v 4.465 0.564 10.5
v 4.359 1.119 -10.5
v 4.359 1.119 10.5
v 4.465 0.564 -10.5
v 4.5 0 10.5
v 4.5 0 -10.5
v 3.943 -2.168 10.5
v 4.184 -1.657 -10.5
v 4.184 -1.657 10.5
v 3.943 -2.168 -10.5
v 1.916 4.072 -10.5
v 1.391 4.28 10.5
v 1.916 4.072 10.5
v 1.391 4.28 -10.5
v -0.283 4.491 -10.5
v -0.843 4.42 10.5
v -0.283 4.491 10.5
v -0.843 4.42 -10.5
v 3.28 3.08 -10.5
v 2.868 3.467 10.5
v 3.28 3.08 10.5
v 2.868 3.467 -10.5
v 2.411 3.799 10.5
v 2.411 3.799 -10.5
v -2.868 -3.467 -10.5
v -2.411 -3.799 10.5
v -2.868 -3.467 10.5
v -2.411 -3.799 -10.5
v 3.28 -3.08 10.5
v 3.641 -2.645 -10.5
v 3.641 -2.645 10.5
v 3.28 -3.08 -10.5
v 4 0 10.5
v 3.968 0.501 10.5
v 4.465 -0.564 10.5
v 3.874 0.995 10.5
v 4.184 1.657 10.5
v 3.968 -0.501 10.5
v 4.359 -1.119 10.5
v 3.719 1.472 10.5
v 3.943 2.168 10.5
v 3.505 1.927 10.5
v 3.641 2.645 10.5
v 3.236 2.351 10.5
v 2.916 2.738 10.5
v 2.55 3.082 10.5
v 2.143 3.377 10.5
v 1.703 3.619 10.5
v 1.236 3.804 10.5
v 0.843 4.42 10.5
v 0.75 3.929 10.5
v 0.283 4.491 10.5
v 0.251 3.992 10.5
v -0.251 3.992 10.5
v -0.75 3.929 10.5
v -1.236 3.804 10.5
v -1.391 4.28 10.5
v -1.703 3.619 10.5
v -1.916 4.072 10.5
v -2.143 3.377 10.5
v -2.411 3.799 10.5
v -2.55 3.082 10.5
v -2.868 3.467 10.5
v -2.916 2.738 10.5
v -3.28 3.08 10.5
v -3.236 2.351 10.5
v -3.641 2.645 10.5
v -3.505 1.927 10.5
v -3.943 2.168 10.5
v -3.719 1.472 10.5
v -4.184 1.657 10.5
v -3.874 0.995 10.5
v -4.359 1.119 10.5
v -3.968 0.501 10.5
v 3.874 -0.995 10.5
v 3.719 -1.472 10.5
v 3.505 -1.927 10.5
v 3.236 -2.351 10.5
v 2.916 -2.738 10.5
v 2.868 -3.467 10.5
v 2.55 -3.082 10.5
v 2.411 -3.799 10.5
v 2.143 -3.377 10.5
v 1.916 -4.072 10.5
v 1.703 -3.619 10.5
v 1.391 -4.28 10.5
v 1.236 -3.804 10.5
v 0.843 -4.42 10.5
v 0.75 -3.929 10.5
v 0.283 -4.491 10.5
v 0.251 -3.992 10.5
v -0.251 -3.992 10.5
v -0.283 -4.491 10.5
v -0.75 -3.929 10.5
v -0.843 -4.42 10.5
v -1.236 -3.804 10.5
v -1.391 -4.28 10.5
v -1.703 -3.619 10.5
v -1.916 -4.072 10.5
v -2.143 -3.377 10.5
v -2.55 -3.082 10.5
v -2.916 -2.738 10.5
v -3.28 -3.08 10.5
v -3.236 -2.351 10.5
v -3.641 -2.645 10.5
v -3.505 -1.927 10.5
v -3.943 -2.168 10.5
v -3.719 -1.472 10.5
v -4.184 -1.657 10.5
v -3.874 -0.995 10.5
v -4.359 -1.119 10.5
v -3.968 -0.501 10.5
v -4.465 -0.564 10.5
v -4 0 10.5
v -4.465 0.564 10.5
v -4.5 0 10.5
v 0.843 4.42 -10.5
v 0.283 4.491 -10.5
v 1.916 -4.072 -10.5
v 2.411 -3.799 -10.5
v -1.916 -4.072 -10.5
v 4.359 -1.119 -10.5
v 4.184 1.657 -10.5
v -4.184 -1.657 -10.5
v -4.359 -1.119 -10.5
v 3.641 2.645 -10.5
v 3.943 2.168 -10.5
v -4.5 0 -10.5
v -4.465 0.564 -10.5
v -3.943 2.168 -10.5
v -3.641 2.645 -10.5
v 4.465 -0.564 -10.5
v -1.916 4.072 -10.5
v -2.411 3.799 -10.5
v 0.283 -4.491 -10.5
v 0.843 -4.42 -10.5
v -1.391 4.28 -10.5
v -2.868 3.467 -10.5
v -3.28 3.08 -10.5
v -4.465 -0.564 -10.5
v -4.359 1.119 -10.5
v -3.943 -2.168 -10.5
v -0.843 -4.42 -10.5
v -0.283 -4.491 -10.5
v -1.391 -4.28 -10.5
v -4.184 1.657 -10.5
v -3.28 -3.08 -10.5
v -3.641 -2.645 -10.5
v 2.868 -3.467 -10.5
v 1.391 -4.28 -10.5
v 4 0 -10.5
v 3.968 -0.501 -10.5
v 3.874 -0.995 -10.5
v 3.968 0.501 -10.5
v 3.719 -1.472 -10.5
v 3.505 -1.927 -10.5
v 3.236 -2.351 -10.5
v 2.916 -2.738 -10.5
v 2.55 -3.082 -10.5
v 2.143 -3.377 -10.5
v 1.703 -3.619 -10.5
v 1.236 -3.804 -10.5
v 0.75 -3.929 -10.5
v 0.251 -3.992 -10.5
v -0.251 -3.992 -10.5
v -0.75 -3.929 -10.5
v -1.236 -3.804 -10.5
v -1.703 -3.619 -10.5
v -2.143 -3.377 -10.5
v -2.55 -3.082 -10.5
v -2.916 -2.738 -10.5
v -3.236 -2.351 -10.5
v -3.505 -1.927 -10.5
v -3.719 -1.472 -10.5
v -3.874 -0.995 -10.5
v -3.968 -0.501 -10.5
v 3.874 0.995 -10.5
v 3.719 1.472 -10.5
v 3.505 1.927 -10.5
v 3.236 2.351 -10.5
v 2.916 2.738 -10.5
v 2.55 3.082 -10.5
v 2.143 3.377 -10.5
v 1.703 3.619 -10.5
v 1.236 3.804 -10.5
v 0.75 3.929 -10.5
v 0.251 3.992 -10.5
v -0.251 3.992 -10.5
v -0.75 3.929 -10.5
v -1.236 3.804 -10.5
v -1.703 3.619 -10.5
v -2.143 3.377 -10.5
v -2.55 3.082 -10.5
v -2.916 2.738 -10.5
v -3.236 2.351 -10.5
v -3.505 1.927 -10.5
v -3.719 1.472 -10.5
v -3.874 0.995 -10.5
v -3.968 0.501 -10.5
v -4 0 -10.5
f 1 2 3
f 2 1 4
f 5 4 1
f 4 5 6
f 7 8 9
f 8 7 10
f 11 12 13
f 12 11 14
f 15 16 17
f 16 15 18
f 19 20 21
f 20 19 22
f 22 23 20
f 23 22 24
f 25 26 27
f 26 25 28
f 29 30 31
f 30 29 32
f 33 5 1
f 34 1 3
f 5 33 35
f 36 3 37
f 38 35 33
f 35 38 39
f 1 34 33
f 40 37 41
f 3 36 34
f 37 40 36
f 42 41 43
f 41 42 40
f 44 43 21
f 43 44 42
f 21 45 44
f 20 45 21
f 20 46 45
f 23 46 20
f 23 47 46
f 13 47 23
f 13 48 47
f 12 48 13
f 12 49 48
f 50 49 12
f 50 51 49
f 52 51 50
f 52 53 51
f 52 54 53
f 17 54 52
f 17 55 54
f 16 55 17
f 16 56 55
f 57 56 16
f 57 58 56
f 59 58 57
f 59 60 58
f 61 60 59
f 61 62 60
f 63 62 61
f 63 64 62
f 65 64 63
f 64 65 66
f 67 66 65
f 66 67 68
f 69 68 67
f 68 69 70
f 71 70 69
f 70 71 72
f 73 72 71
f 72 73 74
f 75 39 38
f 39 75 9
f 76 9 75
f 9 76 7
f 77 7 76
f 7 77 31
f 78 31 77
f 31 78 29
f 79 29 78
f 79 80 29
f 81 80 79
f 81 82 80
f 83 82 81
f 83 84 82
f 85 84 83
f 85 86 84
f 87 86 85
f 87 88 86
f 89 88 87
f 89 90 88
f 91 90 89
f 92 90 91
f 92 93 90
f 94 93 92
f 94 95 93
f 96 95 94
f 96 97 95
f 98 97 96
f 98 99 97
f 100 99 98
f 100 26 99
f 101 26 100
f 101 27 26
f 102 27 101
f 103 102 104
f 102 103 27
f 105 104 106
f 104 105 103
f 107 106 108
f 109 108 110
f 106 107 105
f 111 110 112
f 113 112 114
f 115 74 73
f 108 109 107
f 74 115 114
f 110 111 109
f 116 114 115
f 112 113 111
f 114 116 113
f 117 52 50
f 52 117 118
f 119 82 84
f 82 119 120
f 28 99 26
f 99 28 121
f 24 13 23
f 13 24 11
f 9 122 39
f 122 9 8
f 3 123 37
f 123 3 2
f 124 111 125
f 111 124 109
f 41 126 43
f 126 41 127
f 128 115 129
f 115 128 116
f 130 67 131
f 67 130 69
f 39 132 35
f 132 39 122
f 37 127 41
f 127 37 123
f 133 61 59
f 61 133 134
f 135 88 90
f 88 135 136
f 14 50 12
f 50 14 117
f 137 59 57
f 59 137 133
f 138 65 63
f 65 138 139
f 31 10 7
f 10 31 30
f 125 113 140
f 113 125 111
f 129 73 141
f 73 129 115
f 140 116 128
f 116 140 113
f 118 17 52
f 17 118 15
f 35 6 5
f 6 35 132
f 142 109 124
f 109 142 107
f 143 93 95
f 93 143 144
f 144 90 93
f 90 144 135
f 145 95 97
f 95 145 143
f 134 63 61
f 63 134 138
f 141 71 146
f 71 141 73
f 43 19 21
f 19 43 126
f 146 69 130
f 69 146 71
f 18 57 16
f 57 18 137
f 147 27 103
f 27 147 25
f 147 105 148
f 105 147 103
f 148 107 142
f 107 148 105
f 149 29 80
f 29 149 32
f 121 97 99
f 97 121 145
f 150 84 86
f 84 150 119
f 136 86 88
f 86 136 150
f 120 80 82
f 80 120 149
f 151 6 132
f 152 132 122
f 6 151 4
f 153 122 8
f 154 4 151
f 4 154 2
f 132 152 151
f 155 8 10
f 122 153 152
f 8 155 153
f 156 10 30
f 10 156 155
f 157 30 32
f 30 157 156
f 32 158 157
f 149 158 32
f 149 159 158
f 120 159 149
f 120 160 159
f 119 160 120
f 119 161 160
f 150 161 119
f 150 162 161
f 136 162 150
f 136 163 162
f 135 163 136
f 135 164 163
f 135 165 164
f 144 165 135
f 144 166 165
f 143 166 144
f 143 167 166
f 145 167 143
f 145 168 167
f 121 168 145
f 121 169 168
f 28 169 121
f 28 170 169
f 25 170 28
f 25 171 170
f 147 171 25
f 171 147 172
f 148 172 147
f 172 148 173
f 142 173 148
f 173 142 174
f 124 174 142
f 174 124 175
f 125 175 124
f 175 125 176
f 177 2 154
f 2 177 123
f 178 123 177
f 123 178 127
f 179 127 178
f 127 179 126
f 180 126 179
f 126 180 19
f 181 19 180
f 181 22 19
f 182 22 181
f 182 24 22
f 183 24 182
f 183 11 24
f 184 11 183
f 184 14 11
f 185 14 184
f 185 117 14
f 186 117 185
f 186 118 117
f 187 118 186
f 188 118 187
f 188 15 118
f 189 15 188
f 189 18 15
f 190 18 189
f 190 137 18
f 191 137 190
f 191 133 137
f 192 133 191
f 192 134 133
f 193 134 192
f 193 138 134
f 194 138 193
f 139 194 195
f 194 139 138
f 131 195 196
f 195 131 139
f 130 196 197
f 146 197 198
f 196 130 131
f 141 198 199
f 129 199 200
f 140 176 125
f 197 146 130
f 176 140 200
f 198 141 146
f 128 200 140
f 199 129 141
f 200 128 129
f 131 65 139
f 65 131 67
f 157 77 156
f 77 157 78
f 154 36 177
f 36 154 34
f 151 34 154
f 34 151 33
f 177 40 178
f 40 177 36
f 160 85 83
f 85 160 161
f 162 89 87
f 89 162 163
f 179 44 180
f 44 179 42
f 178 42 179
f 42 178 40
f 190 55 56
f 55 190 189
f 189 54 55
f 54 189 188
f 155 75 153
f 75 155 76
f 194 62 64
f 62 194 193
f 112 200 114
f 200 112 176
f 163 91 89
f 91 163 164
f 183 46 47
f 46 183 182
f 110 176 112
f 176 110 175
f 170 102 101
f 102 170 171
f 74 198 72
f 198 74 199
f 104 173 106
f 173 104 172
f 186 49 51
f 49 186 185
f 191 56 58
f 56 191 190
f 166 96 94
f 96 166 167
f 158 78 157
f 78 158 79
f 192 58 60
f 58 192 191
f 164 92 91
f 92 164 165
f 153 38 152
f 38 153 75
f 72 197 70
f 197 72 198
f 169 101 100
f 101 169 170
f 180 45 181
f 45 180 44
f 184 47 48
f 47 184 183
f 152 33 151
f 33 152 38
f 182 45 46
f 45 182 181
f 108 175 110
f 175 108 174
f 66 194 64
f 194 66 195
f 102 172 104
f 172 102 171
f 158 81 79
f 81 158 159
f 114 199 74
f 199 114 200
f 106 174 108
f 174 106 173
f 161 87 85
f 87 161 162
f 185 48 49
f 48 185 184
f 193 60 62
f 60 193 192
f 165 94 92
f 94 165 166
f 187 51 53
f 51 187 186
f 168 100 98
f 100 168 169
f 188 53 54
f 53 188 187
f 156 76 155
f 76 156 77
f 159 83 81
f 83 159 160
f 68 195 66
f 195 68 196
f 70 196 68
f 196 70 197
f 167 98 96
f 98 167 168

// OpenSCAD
$fn = 50;


difference() {
	union() {
		translate(v = [0, 0, -10.5000000000]) {
			cylinder(h = 21, r = 4.5000000000);
		}
	}
	union() {
		translate(v = [0, 0, -100.0000000000]) {
			cylinder(h = 200, r = 4.0000000000);
		}
	}
}
